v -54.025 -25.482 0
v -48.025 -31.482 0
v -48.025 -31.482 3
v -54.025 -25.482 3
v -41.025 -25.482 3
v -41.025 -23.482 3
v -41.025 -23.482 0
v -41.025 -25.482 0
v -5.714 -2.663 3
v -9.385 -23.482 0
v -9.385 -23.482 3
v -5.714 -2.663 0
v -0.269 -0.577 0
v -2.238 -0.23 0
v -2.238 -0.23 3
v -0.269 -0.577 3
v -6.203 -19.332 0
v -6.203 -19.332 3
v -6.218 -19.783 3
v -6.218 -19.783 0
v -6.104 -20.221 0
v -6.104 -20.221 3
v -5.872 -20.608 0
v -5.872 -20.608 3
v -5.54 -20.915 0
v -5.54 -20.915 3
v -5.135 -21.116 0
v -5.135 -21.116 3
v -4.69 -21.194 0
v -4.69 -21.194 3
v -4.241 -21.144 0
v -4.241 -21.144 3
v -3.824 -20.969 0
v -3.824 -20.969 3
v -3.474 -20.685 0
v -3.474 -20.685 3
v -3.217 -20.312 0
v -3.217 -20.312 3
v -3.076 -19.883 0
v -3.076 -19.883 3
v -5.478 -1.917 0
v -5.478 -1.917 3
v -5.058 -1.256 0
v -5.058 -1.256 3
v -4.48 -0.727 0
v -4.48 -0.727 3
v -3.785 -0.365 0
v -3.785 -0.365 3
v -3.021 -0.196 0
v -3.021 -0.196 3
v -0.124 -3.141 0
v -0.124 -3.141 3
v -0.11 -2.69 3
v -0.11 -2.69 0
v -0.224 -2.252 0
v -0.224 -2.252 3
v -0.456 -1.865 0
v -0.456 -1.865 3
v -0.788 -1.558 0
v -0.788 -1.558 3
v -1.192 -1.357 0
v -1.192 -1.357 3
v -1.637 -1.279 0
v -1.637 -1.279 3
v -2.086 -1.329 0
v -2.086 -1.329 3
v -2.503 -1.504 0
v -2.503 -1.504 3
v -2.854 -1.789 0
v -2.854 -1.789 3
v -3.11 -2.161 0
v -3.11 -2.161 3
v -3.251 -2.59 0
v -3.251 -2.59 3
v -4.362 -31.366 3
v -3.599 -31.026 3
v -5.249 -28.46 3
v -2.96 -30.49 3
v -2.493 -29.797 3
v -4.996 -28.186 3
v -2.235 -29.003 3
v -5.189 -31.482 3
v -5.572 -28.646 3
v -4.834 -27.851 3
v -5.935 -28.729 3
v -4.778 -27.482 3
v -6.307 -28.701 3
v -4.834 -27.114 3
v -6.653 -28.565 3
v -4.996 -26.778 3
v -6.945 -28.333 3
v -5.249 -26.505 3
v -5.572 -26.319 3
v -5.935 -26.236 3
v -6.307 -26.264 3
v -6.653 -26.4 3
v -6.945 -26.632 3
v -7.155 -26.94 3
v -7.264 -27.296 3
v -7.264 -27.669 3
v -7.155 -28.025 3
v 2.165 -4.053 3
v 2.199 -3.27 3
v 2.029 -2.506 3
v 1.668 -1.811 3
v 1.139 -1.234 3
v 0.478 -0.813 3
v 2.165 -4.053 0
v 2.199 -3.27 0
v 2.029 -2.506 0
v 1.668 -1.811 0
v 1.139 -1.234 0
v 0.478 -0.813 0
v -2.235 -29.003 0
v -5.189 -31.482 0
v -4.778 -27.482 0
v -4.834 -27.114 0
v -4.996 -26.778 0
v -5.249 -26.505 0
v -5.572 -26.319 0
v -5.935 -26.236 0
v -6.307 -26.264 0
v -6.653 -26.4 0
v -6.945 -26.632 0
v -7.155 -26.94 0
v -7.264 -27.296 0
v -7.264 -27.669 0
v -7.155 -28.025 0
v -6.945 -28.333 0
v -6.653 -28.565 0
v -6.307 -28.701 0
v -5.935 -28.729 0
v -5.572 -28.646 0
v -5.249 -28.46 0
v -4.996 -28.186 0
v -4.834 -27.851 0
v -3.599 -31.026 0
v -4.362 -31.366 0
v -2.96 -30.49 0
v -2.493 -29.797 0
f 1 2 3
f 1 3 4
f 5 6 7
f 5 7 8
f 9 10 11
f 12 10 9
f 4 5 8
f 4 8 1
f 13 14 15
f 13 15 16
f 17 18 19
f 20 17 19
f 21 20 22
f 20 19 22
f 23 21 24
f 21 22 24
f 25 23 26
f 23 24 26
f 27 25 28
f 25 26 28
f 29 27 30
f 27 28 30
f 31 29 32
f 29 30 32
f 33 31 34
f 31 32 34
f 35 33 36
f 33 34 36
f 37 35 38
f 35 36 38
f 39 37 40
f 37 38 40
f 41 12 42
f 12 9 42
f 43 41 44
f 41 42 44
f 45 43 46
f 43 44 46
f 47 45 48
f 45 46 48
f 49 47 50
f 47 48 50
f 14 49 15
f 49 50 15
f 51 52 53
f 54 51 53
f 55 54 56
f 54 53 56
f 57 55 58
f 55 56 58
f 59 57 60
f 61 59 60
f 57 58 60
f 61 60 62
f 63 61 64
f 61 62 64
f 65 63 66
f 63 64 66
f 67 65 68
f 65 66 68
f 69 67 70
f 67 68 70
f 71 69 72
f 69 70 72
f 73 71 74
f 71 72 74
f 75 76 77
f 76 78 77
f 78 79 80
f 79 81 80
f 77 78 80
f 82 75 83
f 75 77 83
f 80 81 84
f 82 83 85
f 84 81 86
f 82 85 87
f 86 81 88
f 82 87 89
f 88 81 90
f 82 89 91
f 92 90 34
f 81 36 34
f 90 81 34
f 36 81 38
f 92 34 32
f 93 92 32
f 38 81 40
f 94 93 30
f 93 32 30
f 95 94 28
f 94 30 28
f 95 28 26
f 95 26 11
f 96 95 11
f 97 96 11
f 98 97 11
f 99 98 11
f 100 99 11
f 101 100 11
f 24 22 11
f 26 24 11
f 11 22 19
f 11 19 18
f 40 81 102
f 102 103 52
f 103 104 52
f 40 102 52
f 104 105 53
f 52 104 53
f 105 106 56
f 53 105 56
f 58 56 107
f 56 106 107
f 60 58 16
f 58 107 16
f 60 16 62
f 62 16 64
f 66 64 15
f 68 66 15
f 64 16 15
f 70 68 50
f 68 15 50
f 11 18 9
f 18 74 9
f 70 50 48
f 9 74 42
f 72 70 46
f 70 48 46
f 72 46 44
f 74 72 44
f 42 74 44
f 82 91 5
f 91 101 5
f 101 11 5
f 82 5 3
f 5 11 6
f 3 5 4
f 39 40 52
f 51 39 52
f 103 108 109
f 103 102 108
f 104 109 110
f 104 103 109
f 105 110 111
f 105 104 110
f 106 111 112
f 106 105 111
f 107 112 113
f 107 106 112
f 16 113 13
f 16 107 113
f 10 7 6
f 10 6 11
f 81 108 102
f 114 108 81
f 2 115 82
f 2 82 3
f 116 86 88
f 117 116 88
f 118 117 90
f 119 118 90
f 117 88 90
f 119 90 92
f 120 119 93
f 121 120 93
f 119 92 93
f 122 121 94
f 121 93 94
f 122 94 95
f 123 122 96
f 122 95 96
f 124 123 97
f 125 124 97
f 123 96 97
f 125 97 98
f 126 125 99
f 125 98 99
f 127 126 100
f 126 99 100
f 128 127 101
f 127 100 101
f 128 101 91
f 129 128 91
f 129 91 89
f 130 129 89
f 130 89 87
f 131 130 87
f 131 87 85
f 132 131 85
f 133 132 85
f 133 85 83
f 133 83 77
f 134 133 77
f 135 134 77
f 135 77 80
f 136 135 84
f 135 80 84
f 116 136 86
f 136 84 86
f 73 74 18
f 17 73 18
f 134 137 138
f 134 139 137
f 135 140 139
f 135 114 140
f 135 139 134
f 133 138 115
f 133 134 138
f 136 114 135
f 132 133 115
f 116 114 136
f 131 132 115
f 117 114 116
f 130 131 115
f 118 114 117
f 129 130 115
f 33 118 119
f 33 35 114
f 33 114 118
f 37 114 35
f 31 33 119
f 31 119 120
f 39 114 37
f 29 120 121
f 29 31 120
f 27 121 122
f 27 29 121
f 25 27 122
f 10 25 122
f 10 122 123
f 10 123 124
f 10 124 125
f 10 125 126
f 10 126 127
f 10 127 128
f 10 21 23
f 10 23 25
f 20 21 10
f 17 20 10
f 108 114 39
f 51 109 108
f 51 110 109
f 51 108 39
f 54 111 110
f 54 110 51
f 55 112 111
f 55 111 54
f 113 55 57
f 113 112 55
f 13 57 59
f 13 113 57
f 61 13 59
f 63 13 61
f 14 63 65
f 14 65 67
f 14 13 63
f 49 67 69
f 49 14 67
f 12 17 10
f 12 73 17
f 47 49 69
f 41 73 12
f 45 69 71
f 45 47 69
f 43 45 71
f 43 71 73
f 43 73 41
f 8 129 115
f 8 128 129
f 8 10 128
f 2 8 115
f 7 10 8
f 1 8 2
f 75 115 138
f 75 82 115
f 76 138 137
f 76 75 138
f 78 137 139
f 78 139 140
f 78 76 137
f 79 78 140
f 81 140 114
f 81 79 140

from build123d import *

# Parameters (mm, degrees)
BOSS_EXTRUDE1_DEPTH = 3
SKETCH2_R           = 1.25
CUT_EXTRUDE1_DEPTH  = 3
FILLET1_R           = 3


with BuildPart() as part:
    # Sketch1 → Boss-Extrude1 (new body)
    with BuildSketch(Plane.XY):
        Polygon((-56.024750416, -23.482321131), (-9.384750416, -23.482321131), (-5.192883407, 0.290938026), (2.685578617, -1.098247395), (-2.671953367, -31.482321131), (-48.024750416, -31.482321131), align=None)
    extrude(amount=BOSS_EXTRUDE1_DEPTH)

    # Sketch2 → Cut-Extrude1 (cut)
    with BuildSketch(Plane.XY.offset(3)):
        with Locations((-6.028351891, -27.482321131)):
            Circle(SKETCH2_R)
        Polygon((-56.024750416, -23.482321131), (-41.024750416, -23.482321131), (-41.024750416, -25.482321131), (-54.024750416, -25.482321131), align=None)
        with BuildLine():
            Line((-3.251155147, -2.590007585), (-6.203174167, -19.331739386))
            ThreePointArc((-6.203174167, -19.331739386), (-4.915458342, -21.170788176), (-3.076409552, -19.88307235))
            Line((-3.076409552, -19.88307235), (-0.124390531, -3.141340549))
            ThreePointArc((-0.124390531, -3.141340549), (-1.412106357, -1.302291759), (-3.251155147, -2.590007585))
        make_face()
    extrude(amount=-CUT_EXTRUDE1_DEPTH, mode=Mode.SUBTRACT)

    # Fillet1
    fillet1_edges = [part.edges().sort_by_distance(p)[0] for p in [
        (-5.192883407, 0.290938026, 1.5),
        (2.685578617, -1.098247395, 1.5),
        (-2.671953367, -31.482321131, 1.5),
    ]]
    fillet(fillet1_edges, radius=FILLET1_R)


solid = part.part
